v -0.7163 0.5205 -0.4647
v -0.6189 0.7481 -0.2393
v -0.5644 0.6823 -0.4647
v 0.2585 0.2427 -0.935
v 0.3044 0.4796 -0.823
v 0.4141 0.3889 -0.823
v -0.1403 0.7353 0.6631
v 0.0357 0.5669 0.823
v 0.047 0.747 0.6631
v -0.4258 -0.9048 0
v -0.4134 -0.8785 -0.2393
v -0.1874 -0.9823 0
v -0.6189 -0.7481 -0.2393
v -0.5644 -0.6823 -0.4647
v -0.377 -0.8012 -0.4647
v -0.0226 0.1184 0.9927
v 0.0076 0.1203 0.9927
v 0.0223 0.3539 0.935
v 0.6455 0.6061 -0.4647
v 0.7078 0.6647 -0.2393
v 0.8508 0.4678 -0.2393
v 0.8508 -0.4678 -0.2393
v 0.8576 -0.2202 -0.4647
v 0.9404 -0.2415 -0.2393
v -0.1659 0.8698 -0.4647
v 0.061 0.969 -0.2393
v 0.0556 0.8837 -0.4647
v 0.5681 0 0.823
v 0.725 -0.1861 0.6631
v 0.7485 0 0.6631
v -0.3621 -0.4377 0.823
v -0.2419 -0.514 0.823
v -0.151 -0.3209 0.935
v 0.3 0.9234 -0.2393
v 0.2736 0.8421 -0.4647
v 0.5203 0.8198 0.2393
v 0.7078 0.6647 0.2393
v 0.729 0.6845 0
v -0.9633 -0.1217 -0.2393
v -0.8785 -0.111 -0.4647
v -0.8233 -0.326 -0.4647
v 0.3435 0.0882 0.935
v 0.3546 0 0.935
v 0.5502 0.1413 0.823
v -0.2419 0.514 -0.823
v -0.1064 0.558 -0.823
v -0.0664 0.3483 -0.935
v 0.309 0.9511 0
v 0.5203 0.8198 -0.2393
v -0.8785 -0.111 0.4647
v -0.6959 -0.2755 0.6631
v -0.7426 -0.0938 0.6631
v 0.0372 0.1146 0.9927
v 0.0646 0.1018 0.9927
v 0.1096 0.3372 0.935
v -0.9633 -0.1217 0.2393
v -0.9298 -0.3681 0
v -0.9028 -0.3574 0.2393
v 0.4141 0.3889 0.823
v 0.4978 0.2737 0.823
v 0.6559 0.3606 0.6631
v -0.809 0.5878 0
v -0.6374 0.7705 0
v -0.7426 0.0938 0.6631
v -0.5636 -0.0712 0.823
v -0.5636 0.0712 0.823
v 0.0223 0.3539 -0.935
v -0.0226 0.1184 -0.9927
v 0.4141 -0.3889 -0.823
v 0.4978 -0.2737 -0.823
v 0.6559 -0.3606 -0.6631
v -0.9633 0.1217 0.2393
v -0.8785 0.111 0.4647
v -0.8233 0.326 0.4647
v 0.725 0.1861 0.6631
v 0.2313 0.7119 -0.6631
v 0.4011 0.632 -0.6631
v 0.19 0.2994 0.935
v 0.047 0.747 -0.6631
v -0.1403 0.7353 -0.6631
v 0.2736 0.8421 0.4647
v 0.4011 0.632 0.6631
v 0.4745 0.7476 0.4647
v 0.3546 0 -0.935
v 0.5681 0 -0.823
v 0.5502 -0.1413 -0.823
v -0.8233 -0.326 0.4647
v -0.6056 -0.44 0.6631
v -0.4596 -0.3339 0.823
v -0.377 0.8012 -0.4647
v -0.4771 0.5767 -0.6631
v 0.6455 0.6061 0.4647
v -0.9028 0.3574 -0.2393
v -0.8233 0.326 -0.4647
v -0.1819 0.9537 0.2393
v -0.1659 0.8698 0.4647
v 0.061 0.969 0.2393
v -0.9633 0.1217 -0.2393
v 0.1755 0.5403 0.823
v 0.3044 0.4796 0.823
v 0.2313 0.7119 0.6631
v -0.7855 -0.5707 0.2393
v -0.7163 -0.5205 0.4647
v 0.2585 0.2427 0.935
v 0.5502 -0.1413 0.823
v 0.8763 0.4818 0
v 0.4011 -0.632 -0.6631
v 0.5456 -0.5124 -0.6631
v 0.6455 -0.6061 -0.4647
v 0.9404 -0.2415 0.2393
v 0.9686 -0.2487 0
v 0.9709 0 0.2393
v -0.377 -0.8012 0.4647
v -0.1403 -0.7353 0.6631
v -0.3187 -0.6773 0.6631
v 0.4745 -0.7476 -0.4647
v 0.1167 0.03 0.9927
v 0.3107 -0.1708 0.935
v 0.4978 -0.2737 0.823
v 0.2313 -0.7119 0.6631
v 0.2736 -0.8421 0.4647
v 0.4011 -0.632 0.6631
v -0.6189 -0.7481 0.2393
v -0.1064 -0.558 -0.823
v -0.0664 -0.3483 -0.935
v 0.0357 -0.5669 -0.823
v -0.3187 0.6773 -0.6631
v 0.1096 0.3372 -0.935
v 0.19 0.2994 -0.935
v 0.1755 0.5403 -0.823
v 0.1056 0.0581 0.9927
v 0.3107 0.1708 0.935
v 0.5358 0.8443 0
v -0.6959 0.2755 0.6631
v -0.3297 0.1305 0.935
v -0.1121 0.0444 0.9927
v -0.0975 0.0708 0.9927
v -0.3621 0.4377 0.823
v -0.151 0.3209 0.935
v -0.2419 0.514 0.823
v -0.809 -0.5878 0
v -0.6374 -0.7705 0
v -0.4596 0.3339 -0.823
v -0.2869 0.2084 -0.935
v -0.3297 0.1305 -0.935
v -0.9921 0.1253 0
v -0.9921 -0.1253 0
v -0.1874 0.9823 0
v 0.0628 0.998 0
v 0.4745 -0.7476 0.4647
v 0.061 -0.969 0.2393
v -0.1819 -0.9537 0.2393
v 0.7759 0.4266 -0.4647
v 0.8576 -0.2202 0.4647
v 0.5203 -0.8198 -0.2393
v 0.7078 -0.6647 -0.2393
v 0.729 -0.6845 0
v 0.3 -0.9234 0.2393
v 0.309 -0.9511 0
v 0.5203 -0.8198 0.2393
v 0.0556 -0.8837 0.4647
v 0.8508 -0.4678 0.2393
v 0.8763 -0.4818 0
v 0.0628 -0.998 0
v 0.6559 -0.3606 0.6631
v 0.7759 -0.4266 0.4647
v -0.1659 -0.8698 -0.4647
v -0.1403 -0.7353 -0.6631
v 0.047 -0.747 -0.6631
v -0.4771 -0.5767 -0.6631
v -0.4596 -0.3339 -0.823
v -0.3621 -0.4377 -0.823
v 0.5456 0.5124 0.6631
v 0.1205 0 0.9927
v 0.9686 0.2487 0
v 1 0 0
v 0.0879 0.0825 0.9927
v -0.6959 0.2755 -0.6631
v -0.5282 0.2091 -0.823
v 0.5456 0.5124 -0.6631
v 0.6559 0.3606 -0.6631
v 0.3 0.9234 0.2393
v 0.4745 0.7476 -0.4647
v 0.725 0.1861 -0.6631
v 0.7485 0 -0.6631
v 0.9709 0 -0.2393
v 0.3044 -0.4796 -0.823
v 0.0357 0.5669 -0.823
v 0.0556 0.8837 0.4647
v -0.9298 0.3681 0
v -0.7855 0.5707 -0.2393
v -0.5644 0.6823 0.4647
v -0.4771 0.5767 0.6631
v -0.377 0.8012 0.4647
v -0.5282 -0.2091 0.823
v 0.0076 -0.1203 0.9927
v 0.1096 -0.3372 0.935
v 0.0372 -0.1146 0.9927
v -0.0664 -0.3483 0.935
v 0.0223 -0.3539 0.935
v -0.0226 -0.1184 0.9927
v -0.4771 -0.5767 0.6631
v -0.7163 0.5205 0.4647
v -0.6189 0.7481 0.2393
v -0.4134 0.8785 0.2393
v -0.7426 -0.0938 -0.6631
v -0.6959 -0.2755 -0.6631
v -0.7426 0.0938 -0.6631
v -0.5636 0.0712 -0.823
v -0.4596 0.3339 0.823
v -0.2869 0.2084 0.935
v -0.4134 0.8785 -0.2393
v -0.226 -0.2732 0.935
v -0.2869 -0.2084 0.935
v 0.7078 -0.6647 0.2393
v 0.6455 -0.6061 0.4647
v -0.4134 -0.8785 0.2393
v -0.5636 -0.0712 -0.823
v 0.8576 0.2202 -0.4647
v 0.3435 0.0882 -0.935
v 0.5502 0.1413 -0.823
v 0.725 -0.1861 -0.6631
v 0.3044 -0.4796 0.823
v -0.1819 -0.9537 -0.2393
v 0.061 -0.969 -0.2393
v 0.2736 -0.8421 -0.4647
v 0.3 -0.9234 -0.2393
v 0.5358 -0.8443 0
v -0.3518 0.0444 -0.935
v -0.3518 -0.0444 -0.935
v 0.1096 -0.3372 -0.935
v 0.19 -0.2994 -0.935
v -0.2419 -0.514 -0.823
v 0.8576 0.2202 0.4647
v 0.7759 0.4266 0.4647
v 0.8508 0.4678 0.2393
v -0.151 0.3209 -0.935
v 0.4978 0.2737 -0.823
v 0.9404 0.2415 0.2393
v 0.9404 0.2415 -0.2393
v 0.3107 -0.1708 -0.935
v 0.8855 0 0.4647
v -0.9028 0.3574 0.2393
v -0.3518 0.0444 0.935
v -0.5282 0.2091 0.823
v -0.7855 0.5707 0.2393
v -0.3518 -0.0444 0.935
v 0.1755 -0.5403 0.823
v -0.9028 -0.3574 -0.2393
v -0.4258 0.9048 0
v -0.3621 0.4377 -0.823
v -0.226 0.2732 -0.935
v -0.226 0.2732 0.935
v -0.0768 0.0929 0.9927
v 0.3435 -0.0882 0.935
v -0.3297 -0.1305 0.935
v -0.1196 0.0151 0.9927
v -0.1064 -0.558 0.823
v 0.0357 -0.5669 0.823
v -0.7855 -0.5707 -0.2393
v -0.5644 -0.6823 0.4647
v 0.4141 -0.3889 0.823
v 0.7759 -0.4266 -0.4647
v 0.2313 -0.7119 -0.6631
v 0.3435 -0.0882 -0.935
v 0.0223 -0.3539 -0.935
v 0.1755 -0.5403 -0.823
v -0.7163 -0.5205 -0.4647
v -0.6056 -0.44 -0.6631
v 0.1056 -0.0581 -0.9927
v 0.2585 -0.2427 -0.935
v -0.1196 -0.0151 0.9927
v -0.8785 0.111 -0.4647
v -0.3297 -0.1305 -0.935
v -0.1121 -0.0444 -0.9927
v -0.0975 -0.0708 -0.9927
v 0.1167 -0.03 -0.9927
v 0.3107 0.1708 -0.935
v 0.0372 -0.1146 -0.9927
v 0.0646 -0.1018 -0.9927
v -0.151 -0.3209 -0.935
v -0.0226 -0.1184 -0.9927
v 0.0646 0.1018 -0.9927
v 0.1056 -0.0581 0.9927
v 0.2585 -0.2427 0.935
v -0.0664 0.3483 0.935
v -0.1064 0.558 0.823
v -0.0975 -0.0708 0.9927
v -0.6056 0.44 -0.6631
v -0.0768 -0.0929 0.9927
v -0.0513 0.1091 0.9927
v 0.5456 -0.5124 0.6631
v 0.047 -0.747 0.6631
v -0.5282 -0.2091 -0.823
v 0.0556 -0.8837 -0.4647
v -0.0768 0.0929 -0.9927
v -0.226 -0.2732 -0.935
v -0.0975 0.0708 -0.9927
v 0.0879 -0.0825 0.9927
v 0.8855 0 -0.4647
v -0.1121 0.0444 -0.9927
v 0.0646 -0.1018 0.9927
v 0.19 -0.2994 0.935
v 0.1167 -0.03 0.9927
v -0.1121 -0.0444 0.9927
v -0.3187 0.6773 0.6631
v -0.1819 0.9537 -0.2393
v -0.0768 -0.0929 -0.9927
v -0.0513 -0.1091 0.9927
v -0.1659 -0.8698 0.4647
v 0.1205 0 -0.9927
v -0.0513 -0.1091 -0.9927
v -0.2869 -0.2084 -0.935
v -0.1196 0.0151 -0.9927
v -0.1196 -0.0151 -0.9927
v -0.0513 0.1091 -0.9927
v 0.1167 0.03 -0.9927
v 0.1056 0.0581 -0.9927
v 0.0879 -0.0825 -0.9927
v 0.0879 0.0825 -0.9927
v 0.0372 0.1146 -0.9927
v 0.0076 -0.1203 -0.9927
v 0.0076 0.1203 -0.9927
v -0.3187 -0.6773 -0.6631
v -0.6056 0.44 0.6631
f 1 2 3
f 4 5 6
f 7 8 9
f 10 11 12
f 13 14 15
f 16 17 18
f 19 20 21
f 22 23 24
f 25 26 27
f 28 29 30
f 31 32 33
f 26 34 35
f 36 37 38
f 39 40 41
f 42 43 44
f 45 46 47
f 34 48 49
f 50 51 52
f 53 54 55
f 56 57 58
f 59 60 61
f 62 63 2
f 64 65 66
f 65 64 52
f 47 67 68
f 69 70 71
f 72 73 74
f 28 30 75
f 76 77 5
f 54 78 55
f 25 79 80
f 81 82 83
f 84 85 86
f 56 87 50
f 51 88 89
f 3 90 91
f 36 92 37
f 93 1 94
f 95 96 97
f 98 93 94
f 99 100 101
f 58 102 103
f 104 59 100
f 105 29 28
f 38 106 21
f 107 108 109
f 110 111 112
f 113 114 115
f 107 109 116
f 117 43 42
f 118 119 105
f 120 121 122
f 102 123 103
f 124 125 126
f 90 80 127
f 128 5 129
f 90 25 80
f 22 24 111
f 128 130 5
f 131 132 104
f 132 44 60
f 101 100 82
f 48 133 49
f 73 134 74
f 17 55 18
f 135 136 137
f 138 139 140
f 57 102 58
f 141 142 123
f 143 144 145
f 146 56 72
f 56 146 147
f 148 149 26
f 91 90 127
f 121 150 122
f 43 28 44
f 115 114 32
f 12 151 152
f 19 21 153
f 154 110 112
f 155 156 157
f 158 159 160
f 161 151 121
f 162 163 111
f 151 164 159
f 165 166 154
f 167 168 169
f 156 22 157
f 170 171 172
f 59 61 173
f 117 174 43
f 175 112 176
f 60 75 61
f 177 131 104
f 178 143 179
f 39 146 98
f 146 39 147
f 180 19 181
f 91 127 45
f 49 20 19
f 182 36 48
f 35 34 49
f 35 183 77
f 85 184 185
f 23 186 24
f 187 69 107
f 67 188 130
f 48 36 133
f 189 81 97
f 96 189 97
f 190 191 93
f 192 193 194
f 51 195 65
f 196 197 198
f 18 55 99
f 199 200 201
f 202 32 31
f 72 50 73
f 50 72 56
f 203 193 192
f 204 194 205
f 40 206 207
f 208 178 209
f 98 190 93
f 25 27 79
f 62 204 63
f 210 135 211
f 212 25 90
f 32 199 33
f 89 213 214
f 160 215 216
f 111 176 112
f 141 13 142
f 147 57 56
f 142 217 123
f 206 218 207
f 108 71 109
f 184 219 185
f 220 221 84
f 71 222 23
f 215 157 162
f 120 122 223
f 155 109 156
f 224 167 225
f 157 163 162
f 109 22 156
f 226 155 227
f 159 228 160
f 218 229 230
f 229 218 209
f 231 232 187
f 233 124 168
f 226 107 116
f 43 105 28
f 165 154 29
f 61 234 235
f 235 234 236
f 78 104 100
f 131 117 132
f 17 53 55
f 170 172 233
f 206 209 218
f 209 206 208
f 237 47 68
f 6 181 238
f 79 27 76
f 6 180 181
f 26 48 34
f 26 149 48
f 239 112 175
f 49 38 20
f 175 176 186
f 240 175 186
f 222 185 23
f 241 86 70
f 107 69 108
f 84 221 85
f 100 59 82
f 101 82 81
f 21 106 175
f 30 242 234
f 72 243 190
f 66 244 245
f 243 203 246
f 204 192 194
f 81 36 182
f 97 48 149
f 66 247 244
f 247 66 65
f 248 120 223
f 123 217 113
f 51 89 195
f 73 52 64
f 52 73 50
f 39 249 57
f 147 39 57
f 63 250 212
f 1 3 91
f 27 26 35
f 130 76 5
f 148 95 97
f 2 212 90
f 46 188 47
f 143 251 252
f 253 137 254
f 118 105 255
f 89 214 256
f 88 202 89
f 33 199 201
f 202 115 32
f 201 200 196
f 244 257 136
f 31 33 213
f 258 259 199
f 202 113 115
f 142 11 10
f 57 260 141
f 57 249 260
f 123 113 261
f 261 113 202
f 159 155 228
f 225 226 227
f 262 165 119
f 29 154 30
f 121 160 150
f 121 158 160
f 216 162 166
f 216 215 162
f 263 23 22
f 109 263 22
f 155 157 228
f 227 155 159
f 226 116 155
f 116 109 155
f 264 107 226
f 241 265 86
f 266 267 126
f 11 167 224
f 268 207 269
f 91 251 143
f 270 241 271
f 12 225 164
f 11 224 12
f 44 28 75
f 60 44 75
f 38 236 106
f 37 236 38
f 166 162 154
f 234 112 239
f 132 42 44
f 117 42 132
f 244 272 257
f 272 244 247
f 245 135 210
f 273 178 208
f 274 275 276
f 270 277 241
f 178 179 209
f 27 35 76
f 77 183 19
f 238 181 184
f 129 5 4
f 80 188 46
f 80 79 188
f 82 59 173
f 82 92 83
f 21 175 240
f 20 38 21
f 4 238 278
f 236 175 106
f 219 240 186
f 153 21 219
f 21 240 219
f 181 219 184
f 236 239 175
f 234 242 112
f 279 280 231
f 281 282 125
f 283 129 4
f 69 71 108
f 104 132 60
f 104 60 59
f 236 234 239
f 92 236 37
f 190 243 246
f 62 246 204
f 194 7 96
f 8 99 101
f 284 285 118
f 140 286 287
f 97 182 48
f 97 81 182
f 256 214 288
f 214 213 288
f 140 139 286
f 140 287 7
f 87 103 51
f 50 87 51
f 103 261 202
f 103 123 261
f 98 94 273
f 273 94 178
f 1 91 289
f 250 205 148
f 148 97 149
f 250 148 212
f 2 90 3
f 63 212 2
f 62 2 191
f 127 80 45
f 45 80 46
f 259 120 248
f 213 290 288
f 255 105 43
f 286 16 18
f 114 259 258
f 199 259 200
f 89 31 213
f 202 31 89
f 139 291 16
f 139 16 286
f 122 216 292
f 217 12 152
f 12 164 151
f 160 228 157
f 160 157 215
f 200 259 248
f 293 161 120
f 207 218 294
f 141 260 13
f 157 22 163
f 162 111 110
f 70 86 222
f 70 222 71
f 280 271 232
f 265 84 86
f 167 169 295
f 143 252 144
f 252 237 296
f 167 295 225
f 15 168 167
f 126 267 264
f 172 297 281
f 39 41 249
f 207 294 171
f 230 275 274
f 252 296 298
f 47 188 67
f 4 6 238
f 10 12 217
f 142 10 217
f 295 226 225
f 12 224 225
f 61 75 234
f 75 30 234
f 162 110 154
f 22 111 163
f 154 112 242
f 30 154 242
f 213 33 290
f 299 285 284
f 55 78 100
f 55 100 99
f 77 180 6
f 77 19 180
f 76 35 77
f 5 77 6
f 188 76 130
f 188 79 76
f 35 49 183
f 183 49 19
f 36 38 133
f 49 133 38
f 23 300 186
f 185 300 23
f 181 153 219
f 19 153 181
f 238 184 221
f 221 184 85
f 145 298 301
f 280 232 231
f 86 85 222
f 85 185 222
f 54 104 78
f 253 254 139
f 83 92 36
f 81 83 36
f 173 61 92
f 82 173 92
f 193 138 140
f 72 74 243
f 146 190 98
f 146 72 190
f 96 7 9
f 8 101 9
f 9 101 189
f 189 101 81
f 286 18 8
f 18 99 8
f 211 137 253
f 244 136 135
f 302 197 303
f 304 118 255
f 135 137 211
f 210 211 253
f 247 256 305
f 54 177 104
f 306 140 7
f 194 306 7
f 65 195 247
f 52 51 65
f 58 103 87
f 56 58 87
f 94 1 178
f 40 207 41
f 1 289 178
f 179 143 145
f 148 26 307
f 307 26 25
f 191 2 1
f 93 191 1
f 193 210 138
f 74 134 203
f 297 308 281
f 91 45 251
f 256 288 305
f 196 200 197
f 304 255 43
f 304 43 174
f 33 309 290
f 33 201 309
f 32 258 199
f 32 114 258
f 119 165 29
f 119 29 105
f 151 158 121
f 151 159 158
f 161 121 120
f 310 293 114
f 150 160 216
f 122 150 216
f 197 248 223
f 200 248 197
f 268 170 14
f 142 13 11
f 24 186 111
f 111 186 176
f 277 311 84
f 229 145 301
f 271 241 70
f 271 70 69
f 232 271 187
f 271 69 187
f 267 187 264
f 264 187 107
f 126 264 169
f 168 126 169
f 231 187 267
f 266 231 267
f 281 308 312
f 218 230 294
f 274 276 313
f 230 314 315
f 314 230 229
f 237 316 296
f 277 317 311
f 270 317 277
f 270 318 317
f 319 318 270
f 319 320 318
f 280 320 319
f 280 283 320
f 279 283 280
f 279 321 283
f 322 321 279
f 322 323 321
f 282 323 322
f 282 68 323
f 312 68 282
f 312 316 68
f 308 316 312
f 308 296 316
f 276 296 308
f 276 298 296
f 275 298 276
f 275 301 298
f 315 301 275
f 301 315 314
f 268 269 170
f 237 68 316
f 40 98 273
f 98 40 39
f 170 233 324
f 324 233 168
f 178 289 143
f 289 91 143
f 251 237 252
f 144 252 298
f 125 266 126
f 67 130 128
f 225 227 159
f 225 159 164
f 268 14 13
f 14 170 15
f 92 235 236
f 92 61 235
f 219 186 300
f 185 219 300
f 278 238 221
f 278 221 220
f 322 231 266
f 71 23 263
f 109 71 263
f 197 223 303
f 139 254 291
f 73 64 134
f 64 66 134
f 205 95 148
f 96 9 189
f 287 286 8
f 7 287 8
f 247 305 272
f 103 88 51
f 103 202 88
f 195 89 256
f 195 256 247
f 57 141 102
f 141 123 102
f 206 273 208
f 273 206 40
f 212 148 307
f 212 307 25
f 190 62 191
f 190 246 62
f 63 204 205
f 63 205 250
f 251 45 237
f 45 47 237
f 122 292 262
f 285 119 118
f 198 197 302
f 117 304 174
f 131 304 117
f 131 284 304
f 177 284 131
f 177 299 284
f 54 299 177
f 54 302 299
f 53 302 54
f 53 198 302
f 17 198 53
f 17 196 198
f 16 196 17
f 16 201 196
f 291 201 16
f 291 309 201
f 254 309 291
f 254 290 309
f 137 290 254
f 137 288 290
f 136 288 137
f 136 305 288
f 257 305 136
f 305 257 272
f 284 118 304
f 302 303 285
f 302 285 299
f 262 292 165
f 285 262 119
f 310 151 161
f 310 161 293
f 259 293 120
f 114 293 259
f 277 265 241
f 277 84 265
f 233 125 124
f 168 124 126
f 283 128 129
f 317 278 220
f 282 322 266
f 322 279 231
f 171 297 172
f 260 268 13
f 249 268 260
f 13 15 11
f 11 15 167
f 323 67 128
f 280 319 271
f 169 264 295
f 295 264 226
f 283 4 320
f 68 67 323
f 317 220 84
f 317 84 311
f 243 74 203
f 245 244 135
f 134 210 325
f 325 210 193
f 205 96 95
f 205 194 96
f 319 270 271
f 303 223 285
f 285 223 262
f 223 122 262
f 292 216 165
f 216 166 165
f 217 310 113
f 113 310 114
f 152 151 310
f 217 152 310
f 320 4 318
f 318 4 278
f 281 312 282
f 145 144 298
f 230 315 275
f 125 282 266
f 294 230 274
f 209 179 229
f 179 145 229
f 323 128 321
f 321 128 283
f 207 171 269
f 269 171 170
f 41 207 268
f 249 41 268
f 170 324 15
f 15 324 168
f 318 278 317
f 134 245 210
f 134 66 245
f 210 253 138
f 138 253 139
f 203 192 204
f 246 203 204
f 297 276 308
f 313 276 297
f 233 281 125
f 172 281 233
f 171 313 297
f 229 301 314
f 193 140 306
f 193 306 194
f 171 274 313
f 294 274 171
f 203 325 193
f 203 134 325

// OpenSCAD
// file: round_shell.SCAD
include <handle_v0.SCAD>;

xs0 = 5;
xs1 = 6;
xs3 = 6;

xl0 = 12;
xl1 = 15;
xl3 = 12;

ys0 = 6;
ys1 = 5;
ys3 = 5;

yl0 = 11;
yl1 = 13;
yl3 = 10;

z0 = 0;
z1 = 1;
z2 = 3;
z3 = 6;
z4 = 200;

// thickness
t = 1;
// ts = 1;
module RoundShell(xs0,xs1,xs3,xl0,xl1,xl3,ys0,ys1,ys3,yl0,yl1,yl3,z0,z1,z2,z3,z4,t){
    difference() {
        minkowski(){
            handle(xs0,xs1,xs3,xl0,xl1,xl3,ys0,ys1,ys3,yl0,yl1,yl3,z0,z1,z2,z3,z4);
            sphere(r=t,$fn=25);
        }

        //     quarterHandle(xs0+ts,xs1+ts,xs3+ts,xl0+tl,xl1+tl,xl3+tl,ys0+ts,ys1+ts,ys3+ts,yl0+tl,yl1+tl,yl3+tl,z4);
        handle(xs0,xs1,xs3,xl0,xl1,xl3,ys0,ys1,ys3,yl0,yl1,yl3,z0-t,z1,z2,z3,z4+t);
    }
}
// file: handle_v0.SCAD
xs0 = 5;
xs1 = 6;
xs3 = 6;

xl0 = 12;
xl1 = 15;
xl3 = 12;

ys0 = 6;
ys1 = 5;
ys3 = 5;

yl0 = 11;
yl1 = 13;
yl3 = 10;


// z0 = 0;
z1 = 1;
z2 = 3;
z3 = 6;
z4 = 200;

// quarterHandle(xs0,xs1,xs3,xl0,xl1,xl3,ys0,ys1,ys3,yl0,yl1,yl3,z4);

// // for test if polyhedron is properly build or not 1
// difference() {
// 	translate([0,0,1]) cylinder (h = 250, r=20, center = false, $fn=100);
//     quarterHandle(xs0,xs1,xs3,xl0,xl1,xl3,ys0,ys1,ys3,yl0,yl1,yl3,z4);
// }
// // for test if polyhedron is properly build or not 2
// difference() {
//    quarterHandle(xs0,xs1,xs3,xl0,xl1,xl3,ys0,ys1,ys3,yl0,yl1,yl3,z4);
// 	translate([0,0,1]) cylinder (h = 250, r=10, center = false, $fn=100);
// }

module handle(xs0,xs1,xs3,xl0,xl1,xl3,ys0,ys1,ys3,yl0,yl1,yl3,z0,z1,z2,z3,z4)
    union(){
        halfHandle(xs0,xs1,xs3,xl0,xl1,xl3,ys0,ys1,ys3,yl0,yl1,yl3,z0,z1,z2,z3,z4);
        mirror(v=[0,1,0]) halfHandle(xs0,xs1,xs3,xl0,xl1,xl3,ys0,ys1,ys3,yl0,yl1,yl3,z0,z1,z2,z3,z4);
    }

module halfHandle(xs0,xs1,xs3,xl0,xl1,xl3,ys0,ys1,ys3,yl0,yl1,yl3,z0,z1,z2,z3,z4)
    union(){
        quarterHandle(xs0,xs1,xs3,xl0,xl1,xl3,ys0,ys1,ys3,yl0,yl1,yl3,z0,z1,z2,z3,z4);
        mirror(v=[1,0,0]) quarterHandle(xs0,xs1,xs3,xl0,xl1,xl3,ys0,ys1,ys3,yl0,yl1,yl3,z0,z1,z2,z3,z4);
    }

module quarterHandle(xs0,xs1,xs3,xl0,xl1,xl3,ys0,ys1,ys3,yl0,yl1,yl3,z0,z1,z2,z3,z4) {

    polyhedron(
    points=[
        [0,0,z0],[xl0,0,z0],[xl0,ys1,z0],[xs0,yl0,z0],[0,yl0,z0],      // points  0 to  4 for small tilted planes at the bottom
        [0,0,z1],[xl1,0,z1],[xl1,ys1,z1],[xs1,yl1,z1],[0,yl1,z1], // points  5 to  9 at base flat planes
        [0,0,z2],[xl1,0,z2],[xl1,ys1,z2],[xs1,yl1,z2],[0,yl1,z2], // points 10 to 14 for tilted planes
        [0,0,z3],[xl3,0,z3],[xl3,ys3,z3],[xs3,yl3,z3],[0,yl3,z3], // points 15 to 19 for flat planes (bottom side)
        [0,0,z4],[xl3,0,z4],[xl3,ys3,z4],[xs3,yl3,z4],[0,yl3,z4]  // points 20 to 24 for flat planes (top side)
    ],
    faces=[
        [1,   6,   7,   2   ],[2,   7,   8,   3   ],[3,   8,   9,   4   ],
        [1+ 5,6+ 5,7+ 5,2+ 5],[2+ 5,7+ 5,8+ 5,3+ 5],[3+ 5,8+ 5,9+ 5,4+ 5],
        [1+10,6+10,7+10,2+10],[2+10,7+10,8+10,3+10],[3+10,8+10,9+10,4+10],
        [1+15,6+15,7+15,2+15],[2+15,7+15,8+15,3+15],[3+15,8+15,9+15,4+15],
        [0,20,21,16,11,6,1],[0,4,9,14,19,24,20], // 2 inside planes (to be hidden later), bottom side
        [20,24,23,22,21],// top face
        [0,1,2,3,4]// bottom face
     ]
 );
}
// main file
include <handle_v0.SCAD>;
// include <symple_shell.SCAD>;
include <round_shell.SCAD>;


xs0 = 5;
xs1 = 6;
xs3 = 6;

xl0 = 12;
xl1 = 15;
xl3 = 12;

ys0 = 6;
ys1 = 5;
ys3 = 5;

yl0 = 11;
yl1 = 13;
yl3 = 10;

z0 = 0;
z1 = 1;
z2 = 3;
z3 = 6;
z4 = 200;

// thickness
t = 1;
// ts = 1;

RoundShell(xs0,xs1,xs3,xl0,xl1,xl3,ys0,ys1,ys3,yl0,yl1,yl3,z0,z1,z2,z3,z4,t);
